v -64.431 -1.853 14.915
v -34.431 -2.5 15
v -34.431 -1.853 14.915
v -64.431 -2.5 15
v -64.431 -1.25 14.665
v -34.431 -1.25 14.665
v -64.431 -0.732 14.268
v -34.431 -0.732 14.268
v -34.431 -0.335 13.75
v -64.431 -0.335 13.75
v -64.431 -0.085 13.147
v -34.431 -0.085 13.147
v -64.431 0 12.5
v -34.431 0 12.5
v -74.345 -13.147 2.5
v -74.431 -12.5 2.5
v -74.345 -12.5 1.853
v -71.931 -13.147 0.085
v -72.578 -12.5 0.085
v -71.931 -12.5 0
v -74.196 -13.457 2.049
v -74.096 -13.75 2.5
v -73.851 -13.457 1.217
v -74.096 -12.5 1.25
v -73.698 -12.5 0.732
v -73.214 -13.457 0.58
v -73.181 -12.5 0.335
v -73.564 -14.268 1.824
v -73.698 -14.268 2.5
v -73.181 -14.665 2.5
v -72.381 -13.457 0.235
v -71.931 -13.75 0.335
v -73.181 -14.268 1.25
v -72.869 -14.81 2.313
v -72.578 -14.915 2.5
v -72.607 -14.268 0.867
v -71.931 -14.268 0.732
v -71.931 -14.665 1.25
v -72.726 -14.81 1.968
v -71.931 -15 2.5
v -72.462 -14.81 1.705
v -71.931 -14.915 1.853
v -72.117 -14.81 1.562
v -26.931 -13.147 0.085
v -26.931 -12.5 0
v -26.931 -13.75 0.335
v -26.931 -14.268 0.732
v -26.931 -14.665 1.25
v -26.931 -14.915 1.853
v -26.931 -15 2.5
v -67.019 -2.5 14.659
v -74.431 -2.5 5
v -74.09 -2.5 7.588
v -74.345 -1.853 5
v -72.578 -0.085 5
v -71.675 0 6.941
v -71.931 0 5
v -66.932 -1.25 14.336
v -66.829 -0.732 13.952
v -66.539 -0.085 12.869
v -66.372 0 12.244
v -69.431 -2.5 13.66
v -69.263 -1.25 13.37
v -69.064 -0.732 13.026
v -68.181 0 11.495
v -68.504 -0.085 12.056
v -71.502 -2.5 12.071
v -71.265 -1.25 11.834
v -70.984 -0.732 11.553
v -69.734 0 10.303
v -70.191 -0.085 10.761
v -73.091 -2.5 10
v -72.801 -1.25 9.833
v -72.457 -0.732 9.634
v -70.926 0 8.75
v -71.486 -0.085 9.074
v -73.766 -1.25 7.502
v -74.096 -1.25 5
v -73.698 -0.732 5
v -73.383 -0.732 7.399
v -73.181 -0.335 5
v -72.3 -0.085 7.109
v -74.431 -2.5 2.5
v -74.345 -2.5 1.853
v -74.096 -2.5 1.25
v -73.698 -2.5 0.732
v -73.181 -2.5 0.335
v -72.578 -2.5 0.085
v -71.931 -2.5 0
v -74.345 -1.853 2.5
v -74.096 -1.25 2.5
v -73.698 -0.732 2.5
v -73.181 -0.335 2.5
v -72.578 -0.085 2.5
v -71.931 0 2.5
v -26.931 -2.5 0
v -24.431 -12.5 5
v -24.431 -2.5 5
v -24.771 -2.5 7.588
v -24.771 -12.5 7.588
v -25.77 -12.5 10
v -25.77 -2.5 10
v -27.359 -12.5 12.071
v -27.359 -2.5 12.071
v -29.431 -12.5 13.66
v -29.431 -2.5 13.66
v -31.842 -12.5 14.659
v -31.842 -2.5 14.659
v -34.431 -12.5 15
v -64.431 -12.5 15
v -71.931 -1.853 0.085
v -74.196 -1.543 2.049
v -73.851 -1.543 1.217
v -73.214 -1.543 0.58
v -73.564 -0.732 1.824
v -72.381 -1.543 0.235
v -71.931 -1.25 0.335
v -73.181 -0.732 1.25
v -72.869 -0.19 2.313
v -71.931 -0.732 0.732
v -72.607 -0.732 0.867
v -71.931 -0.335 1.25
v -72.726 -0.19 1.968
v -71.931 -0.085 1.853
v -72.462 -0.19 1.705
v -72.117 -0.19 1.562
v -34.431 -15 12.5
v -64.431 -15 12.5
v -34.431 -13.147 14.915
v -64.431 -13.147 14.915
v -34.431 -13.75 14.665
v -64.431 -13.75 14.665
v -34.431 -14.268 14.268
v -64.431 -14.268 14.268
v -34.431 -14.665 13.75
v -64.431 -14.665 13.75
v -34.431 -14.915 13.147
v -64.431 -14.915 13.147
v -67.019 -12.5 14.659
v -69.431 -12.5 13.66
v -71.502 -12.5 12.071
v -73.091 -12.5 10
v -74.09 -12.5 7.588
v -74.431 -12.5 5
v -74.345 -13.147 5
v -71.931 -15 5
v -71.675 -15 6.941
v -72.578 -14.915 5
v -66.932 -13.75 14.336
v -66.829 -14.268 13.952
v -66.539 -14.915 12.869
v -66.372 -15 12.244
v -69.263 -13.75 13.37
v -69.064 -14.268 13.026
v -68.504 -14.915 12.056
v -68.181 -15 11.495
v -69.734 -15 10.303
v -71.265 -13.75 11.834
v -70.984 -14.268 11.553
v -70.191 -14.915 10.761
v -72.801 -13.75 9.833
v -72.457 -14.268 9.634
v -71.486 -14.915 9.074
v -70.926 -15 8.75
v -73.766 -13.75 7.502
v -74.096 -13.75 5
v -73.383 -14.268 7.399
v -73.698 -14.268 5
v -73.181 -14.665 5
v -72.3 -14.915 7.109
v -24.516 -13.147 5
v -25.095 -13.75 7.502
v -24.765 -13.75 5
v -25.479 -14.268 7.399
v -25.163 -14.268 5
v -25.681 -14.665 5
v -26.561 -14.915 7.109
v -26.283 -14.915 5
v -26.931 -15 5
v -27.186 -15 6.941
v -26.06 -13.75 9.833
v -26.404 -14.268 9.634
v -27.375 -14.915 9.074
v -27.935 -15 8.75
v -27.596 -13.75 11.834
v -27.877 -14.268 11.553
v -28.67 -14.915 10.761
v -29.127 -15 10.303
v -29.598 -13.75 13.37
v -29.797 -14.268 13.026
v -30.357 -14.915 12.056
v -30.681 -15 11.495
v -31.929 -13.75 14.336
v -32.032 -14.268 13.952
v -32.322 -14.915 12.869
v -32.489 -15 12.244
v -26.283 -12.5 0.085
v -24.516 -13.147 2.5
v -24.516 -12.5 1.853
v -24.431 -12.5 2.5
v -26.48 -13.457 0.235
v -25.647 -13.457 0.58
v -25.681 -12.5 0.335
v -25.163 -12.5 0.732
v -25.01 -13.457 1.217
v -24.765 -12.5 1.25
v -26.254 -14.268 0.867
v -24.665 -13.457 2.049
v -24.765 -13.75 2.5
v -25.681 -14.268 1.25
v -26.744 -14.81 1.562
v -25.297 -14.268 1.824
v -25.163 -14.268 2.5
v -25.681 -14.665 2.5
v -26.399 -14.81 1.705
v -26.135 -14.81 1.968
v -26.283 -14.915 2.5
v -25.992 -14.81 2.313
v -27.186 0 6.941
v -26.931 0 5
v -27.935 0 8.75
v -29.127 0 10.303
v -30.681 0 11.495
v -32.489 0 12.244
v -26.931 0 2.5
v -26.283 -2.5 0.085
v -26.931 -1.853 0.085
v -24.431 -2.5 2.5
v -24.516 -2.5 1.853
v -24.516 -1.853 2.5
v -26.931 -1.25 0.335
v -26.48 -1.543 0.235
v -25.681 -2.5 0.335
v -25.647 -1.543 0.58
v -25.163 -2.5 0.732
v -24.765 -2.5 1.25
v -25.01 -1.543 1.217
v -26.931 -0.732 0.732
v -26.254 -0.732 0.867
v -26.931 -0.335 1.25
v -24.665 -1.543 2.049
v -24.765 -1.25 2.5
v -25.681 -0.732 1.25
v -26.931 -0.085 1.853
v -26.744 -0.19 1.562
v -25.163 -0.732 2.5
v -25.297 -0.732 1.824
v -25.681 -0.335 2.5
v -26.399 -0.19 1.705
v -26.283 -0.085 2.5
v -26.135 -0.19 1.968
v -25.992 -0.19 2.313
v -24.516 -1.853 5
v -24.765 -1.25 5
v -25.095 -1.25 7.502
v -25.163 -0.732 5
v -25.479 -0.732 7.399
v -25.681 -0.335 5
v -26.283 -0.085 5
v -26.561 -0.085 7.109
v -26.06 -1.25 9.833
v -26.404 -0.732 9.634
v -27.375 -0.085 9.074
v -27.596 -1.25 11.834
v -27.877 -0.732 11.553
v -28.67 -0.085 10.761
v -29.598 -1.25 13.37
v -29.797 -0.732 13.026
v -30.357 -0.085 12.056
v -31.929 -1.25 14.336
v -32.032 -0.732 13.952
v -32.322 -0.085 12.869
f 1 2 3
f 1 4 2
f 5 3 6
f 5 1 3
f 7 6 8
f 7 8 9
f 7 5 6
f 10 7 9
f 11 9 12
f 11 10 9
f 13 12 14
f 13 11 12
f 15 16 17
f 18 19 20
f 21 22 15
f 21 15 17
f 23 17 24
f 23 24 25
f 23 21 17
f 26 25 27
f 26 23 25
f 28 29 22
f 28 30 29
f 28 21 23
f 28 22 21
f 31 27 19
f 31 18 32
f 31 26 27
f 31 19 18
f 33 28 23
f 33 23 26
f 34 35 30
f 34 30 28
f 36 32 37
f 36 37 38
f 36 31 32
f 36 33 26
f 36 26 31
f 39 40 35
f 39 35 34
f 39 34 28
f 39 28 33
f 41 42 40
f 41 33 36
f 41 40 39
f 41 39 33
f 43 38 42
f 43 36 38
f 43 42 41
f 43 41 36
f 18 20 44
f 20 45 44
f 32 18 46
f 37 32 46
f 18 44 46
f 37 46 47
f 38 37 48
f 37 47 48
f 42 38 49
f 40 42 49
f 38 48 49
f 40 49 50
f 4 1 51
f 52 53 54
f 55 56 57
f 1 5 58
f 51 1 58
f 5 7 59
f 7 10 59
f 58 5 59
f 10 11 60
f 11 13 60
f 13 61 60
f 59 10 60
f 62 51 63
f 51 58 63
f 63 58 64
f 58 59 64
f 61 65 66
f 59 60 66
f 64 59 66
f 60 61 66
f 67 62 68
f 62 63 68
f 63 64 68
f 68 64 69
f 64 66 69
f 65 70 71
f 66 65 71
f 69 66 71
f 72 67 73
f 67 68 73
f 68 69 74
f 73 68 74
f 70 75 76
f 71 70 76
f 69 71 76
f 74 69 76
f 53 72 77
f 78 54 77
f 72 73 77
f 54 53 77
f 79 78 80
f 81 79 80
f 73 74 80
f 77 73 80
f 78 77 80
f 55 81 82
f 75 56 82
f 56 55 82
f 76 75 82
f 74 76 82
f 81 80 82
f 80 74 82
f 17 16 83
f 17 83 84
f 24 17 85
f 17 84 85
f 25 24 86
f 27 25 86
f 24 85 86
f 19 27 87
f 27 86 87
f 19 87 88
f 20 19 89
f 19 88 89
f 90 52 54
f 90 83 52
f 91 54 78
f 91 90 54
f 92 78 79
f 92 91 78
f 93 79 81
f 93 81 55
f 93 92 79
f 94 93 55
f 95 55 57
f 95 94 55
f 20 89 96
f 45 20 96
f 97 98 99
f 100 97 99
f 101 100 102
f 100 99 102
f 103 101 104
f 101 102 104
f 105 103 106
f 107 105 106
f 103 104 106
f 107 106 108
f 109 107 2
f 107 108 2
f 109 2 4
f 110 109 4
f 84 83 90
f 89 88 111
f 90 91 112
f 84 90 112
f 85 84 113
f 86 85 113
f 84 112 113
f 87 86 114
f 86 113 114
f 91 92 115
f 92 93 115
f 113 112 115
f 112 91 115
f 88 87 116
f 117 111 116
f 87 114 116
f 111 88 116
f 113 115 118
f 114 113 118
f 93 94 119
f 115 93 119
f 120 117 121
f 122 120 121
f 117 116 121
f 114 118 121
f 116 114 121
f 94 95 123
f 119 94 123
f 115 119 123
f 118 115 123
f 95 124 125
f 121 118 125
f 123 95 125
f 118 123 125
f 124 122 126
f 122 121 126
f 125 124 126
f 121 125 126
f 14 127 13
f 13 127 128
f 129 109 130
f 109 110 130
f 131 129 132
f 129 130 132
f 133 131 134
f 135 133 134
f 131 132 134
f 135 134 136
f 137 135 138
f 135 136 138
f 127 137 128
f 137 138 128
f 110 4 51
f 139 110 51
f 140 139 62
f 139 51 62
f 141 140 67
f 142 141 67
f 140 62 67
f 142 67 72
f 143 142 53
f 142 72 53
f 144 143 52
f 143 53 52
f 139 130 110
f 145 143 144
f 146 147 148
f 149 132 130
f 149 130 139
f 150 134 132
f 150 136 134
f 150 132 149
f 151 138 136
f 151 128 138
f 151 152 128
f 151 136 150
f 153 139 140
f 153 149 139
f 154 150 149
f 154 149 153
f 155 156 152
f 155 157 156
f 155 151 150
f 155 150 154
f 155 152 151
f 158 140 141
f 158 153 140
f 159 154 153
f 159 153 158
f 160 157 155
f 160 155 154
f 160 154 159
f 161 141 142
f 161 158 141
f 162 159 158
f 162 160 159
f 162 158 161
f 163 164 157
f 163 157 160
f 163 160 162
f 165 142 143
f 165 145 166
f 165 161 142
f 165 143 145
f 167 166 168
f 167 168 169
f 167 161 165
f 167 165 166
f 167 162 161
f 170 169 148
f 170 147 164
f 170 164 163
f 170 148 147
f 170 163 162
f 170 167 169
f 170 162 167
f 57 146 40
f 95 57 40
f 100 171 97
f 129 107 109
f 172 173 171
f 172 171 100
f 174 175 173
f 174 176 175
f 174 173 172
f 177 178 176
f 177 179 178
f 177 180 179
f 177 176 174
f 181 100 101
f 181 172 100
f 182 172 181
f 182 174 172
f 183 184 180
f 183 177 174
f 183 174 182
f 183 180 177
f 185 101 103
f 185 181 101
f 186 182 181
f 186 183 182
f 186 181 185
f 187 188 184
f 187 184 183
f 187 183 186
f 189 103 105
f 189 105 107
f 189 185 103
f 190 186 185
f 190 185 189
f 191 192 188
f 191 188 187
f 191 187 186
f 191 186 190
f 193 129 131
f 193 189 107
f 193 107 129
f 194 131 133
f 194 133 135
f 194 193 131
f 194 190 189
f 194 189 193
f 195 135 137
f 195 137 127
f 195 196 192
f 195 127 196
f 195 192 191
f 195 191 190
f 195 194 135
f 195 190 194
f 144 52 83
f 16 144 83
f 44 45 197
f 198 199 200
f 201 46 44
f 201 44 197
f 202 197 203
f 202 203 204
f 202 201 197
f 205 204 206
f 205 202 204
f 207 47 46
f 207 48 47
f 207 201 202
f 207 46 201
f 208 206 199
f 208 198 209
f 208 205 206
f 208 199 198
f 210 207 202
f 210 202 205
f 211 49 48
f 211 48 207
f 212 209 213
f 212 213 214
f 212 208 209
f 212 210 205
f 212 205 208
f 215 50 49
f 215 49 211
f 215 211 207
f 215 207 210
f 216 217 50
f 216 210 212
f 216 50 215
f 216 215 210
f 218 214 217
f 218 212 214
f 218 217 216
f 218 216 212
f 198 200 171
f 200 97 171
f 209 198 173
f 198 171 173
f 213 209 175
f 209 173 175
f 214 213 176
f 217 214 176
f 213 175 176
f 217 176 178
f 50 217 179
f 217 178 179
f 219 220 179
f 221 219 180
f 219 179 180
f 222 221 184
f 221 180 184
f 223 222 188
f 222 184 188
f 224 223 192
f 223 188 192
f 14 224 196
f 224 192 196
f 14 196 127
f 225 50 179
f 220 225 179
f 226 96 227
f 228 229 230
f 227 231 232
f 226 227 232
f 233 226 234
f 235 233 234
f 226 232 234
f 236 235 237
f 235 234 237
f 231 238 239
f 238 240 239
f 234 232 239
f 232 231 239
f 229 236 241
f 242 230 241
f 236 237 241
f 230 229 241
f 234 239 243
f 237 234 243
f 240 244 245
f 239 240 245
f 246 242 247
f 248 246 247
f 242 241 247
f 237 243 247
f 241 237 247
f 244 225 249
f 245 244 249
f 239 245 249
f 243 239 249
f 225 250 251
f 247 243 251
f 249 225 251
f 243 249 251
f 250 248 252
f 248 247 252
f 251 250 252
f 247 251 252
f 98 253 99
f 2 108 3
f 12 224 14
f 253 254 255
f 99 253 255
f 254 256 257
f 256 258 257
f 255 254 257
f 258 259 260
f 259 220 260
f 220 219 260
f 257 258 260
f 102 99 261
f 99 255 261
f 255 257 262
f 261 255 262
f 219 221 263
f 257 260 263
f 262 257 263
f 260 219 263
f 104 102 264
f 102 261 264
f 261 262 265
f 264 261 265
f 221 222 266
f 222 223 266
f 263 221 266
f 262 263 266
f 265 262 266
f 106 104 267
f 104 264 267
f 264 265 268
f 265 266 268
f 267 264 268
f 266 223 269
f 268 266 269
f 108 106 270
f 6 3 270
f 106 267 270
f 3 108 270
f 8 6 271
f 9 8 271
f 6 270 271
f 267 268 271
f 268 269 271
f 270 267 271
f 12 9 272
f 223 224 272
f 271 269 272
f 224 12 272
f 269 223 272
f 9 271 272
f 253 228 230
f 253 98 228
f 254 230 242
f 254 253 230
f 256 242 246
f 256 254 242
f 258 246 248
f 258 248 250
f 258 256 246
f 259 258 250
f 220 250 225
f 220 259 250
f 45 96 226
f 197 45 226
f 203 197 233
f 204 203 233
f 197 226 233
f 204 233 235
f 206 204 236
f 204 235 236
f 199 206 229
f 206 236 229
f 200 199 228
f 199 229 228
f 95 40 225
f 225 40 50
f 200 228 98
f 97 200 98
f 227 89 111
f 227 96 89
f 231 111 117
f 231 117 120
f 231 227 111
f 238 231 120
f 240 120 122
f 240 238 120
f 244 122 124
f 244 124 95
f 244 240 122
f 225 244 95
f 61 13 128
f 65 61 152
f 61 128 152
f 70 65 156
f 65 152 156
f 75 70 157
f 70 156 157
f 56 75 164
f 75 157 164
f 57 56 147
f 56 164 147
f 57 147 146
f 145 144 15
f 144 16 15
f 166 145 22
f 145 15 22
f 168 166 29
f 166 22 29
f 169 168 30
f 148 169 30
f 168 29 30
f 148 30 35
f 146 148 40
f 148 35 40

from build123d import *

# Parameters (mm, degrees)
F1_DEPTH = 15
F2_R     = 2.5
F4_DEPTH = 15.001


with BuildPart() as f1:
    # F0 (on Front) → F1 (new body)
    with BuildSketch(Plane.XZ):
        with BuildLine():
            Line((-34.4305347418, 15), (-64.4305347418, 15))
            ThreePointArc((-64.4305347418, 15), (-71.5016025537, 12.0710678119), (-74.4305347418, 5))
            Line((-74.4305347418, 5), (-24.4305347418, 5))
            ThreePointArc((-24.4305347418, 5), (-27.3594669299, 12.0710678119), (-34.4305347418, 15))
        make_face()
        with BuildLine():
            Line((-24.4305347418, 5), (-74.4305347418, 5))
            Line((-74.4305347418, 5), (-74.4305347418, 2.5))
            ThreePointArc((-74.4305347418, 2.5), (-73.6983016948, 0.732233047), (-71.9305347418, 0))
            Line((-71.9305347418, 0), (-26.9305347418, 0))
            ThreePointArc((-26.9305347418, 0), (-25.1627677888, 0.732233047), (-24.4305347418, 2.5))
            Line((-24.4305347418, 2.5), (-24.4305347418, 5))
        make_face()
    extrude(amount=F1_DEPTH)

    # F2
    f2_edges = [f1.edges().sort_by_distance(p)[0] for p in [
        (-64.430535, -7.5, 15),
        (-74.430535, -7.5, 5),
        (-71.501603, 0, 12.071068),
        (-71.501603, -15, 12.071068),
    ]]
    fillet(f2_edges, radius=F2_R)

    # F3 (on face) → F4 (cut, through all)
    with BuildSketch(Plane.XZ.offset(15)):
        with BuildLine():
            Line((-34.4305347418, 12.5), (-64.4305347418, 12.5))
            ThreePointArc((-64.4305347418, 12.5), (-69.7338356007, 10.3033008589), (-71.9305347418, 5))
            Line((-71.9305347418, 5), (-71.9305347418, 2.5))
            Line((-71.9305347418, 2.5), (-26.9305347418, 2.5))
            Line((-26.9305347418, 2.5), (-26.9305347418, 5))
            ThreePointArc((-26.9305347418, 5), (-29.1272338829, 10.3033008589), (-34.4305347418, 12.5))
        make_face()
    extrude(amount=-F4_DEPTH, mode=Mode.SUBTRACT)


solid = f1.part
